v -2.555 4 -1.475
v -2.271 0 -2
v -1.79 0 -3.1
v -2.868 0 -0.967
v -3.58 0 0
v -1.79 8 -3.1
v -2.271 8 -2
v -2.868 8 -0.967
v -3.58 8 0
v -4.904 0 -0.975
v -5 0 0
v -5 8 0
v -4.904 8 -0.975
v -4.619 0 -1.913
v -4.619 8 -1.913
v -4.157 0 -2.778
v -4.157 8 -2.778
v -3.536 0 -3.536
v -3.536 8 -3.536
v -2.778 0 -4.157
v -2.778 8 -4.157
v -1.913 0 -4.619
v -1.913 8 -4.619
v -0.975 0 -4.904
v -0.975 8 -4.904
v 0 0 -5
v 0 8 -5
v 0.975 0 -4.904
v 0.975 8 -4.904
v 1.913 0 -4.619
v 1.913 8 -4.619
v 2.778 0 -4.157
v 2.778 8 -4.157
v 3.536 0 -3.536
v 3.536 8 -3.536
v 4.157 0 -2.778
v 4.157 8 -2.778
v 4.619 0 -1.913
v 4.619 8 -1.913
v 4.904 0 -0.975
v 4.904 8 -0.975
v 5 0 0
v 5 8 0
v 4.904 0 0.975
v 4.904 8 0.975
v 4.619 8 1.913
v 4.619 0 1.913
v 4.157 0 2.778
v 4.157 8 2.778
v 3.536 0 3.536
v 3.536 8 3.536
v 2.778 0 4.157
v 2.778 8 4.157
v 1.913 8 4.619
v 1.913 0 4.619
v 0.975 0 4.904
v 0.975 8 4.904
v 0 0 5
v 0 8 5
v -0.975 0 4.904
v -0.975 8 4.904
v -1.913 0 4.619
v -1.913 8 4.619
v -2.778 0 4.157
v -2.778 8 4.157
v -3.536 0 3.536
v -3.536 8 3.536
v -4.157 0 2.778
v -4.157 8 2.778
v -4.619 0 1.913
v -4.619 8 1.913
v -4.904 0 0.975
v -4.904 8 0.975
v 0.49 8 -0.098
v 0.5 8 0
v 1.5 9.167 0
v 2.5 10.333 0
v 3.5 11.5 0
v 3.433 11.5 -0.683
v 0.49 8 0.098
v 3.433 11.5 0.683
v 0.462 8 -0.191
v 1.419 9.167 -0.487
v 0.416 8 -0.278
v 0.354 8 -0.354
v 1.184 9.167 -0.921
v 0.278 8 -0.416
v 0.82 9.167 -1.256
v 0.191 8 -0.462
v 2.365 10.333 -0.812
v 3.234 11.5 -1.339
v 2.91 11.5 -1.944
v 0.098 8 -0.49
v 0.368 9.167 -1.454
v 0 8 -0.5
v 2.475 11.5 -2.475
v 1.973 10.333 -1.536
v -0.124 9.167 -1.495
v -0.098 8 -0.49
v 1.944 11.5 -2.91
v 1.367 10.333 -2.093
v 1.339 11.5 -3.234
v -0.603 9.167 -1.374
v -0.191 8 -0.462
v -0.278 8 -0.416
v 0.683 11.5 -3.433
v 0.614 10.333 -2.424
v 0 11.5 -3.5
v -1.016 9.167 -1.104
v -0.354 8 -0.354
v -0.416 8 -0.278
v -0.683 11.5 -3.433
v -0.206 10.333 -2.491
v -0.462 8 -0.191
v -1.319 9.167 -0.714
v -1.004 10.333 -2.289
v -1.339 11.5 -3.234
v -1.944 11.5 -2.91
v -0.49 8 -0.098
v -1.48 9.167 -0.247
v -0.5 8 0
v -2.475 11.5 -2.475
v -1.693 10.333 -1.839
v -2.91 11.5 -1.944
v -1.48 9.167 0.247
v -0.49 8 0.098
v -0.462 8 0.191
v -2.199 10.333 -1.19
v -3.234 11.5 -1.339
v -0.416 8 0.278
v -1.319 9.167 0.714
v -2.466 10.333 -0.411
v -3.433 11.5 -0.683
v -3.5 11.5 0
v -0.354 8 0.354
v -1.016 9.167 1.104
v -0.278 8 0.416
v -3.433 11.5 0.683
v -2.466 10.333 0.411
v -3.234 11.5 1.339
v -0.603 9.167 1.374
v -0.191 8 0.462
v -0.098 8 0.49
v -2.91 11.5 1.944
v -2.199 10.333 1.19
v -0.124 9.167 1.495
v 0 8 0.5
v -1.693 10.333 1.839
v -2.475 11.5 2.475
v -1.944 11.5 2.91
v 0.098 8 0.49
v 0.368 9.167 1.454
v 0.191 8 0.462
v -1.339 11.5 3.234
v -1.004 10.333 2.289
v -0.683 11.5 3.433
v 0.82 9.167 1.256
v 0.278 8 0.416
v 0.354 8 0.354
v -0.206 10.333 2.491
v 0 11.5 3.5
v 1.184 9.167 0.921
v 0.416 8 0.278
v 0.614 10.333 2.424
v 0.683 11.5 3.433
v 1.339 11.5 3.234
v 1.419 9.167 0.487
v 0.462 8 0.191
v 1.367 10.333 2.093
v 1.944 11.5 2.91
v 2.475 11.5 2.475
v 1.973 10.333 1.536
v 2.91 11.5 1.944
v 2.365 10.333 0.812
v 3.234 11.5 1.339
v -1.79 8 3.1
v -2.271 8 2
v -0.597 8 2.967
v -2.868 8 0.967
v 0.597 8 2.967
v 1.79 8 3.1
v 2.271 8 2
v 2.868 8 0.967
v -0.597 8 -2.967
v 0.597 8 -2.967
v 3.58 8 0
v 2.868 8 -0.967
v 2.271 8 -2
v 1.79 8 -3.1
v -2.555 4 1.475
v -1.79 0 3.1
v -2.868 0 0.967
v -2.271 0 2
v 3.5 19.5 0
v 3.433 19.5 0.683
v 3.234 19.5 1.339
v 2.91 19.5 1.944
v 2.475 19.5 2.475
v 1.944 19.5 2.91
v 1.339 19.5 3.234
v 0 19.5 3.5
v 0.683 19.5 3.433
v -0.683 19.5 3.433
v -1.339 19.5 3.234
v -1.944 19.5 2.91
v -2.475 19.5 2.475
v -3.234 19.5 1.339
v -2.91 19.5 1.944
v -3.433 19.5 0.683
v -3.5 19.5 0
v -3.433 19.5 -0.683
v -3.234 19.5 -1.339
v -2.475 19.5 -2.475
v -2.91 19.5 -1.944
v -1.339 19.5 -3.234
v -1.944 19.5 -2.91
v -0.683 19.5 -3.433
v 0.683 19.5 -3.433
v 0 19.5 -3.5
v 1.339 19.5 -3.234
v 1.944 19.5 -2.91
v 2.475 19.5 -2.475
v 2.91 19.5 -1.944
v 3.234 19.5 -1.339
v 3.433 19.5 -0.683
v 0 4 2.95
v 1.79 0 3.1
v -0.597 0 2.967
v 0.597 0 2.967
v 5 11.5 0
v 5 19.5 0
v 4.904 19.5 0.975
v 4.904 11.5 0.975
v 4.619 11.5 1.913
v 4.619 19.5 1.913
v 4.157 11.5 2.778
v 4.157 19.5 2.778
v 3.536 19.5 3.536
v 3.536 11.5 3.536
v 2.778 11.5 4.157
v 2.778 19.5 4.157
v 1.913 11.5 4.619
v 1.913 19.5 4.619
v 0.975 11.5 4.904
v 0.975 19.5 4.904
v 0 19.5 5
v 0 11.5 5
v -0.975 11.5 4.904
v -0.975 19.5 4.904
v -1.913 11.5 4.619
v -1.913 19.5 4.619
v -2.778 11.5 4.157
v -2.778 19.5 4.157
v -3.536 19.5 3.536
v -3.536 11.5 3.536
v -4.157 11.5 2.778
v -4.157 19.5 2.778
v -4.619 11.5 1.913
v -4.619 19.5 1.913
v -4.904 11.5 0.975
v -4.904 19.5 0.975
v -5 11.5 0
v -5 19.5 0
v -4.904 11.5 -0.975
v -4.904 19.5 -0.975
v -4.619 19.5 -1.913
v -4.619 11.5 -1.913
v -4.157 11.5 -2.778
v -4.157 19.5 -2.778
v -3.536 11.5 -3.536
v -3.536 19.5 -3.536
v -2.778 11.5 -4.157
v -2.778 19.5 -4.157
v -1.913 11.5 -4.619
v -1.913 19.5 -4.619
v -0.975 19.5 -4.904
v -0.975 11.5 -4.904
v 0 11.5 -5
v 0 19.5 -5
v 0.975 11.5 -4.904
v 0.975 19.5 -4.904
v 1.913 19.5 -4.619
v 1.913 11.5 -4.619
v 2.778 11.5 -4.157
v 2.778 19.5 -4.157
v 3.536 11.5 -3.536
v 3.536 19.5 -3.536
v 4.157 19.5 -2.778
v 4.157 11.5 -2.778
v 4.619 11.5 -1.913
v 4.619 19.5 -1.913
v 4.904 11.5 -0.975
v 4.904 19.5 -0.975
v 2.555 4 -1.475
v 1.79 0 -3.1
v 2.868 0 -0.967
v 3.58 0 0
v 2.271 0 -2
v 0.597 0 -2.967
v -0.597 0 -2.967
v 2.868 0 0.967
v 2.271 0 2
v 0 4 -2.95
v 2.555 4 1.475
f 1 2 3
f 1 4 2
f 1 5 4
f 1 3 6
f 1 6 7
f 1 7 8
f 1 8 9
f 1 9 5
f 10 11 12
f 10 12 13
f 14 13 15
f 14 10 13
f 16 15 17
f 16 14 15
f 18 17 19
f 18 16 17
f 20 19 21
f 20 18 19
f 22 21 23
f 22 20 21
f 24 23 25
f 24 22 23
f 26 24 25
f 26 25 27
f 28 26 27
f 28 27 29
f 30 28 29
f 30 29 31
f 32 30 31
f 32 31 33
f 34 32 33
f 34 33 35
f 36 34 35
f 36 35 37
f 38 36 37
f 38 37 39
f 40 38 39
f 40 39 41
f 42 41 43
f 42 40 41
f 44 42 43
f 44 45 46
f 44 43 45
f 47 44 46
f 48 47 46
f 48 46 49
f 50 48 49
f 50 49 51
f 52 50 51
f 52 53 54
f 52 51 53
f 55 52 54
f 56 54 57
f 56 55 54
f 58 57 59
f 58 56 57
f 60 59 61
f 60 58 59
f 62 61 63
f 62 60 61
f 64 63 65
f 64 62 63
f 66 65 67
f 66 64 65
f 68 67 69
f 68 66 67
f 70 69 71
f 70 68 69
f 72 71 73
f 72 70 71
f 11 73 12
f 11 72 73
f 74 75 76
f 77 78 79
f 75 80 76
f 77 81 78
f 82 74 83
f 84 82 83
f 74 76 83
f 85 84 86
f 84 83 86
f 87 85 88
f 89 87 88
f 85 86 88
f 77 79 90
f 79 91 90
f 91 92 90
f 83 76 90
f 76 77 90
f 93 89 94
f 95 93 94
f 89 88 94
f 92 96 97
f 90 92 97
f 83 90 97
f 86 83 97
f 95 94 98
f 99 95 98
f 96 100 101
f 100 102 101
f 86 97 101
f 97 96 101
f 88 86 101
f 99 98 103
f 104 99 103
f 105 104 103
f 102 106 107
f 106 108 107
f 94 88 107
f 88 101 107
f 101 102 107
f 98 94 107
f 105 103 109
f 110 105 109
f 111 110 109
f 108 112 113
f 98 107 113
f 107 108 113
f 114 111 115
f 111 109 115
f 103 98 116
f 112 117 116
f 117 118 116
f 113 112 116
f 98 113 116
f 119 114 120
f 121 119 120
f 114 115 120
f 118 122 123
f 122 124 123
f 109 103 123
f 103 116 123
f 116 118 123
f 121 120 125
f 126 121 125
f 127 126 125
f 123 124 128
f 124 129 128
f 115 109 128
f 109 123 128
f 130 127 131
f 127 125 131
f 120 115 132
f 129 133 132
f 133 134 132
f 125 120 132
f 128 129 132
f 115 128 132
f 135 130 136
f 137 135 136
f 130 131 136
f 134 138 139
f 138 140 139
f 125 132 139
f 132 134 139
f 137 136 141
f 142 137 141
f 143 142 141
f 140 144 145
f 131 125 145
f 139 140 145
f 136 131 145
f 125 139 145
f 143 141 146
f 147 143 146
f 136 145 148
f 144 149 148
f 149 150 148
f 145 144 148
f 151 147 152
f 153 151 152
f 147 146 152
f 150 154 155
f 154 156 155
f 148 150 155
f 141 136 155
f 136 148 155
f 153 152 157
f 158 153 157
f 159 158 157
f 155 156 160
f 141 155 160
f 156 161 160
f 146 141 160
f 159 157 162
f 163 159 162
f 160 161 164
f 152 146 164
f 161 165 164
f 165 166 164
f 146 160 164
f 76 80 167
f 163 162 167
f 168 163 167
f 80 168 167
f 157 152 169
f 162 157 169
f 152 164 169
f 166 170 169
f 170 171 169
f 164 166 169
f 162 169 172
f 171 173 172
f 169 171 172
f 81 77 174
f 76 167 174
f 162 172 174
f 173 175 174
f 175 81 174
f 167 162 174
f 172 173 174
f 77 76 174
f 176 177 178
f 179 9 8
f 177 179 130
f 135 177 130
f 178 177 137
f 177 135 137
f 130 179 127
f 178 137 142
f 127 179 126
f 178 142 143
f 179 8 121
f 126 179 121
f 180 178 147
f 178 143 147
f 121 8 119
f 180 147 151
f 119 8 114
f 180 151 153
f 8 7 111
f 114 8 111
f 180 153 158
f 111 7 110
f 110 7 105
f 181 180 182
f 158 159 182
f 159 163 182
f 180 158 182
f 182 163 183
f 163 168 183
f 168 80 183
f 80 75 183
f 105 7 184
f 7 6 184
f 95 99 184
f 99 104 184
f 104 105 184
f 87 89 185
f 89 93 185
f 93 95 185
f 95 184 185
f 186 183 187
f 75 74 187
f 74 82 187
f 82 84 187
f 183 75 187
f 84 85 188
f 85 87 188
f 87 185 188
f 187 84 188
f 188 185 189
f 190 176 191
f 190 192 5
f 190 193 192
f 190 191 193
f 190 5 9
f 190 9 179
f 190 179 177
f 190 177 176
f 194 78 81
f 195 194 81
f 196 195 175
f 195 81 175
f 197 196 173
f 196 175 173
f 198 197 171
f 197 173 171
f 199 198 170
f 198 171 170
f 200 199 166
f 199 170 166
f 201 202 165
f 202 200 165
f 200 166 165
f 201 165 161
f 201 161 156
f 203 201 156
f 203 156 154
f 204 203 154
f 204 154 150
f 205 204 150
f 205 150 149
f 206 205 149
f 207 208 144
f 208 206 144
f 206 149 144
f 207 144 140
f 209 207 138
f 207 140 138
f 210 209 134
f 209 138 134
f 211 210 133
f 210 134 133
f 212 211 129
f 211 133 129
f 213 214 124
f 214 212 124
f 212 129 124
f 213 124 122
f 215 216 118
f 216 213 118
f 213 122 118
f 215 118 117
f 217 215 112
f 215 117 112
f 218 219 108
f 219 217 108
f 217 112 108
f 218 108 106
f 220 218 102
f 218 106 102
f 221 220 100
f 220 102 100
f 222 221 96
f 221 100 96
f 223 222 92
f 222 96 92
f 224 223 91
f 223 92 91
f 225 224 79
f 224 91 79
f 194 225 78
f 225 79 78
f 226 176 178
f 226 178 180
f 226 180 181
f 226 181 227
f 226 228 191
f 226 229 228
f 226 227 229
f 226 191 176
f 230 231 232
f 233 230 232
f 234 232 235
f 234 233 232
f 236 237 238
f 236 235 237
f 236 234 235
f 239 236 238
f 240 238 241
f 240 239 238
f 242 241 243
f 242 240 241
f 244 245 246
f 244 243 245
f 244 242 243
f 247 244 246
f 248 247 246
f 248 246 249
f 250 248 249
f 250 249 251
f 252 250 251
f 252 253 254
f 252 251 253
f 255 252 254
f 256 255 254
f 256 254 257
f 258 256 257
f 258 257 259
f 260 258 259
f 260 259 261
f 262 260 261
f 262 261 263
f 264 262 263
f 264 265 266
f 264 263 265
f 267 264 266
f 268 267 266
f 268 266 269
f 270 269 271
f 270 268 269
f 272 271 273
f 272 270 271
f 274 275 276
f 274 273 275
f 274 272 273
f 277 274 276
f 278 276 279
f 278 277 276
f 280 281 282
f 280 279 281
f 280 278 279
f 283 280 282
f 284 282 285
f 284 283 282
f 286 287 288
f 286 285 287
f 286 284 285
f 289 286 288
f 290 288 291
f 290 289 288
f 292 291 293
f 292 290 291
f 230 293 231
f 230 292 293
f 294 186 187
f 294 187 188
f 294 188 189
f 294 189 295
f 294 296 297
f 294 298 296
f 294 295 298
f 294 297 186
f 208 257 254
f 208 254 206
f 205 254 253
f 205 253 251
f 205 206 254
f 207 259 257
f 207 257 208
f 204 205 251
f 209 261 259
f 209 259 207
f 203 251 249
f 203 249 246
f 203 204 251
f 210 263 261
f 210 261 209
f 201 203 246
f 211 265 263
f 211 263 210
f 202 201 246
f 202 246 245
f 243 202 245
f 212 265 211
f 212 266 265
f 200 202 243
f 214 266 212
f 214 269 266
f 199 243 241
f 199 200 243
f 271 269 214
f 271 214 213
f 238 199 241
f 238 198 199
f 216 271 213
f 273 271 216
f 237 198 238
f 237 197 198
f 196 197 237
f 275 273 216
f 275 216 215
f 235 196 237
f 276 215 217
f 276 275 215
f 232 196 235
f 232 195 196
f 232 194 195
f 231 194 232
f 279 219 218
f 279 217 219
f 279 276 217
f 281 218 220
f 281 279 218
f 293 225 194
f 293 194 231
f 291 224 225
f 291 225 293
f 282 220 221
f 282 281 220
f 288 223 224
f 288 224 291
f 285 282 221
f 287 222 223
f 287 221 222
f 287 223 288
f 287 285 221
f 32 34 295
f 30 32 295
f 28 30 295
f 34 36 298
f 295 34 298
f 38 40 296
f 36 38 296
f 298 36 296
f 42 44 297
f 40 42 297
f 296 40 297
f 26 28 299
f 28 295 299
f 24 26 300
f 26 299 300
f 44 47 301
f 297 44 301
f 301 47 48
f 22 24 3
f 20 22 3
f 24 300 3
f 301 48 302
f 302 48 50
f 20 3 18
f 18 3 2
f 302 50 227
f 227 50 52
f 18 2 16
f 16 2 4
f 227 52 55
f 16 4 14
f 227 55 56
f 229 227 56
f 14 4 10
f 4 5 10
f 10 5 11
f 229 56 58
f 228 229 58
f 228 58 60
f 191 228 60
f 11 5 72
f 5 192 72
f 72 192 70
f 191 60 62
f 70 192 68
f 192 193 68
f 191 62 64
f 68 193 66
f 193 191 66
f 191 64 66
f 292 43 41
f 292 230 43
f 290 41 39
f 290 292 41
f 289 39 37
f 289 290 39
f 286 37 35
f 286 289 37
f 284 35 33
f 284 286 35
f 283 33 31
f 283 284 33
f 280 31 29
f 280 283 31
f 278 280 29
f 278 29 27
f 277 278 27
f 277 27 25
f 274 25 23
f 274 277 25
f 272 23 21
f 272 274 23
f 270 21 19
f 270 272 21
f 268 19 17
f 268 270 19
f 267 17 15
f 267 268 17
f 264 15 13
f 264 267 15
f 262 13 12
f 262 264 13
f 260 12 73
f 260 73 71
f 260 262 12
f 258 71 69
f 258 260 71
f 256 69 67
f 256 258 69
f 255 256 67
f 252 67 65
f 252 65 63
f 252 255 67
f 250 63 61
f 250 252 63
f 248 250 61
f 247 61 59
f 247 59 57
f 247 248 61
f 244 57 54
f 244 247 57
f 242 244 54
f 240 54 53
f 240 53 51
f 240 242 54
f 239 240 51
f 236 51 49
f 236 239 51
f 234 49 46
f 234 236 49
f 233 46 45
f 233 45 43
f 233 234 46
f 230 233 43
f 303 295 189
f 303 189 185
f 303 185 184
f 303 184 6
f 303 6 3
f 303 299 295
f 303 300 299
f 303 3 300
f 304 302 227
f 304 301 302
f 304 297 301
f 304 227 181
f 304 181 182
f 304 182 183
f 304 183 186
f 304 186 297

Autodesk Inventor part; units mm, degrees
ref_plane "YZ Plane" through (0, 0, 0) normal (1, 0, 0) x (0, 1, 0)
ref_plane "XZ Plane" through (0, 0, 0) normal (0, 1, 0) x (-1, 0, 0)
ref_plane "XY Plane" through (0, 0, 0) normal (0, 0, 1) x (1, 0, 0)
sketch "Sketch1" plane through (0, 0, 0) normal (0, 1, 0) x (-1, 0, 0)
  line L0 (-1.7898, -3.1) -> (-3.5796, 0)
  line L1 (-3.5796, 0) -> (-1.7898, 3.1)
  line L2 (-1.7898, 3.1) -> (1.7898, 3.1)
  line L3 (1.7898, 3.1) -> (3.5796, 0)
  line L4 (3.5796, 0) -> (1.7898, -3.1)
  line L5 (1.7898, -3.1) -> (-1.7898, -3.1)
  circle A0 centre (0, 0) radius 5
  spline S0 degree 2 poles (1.7898, 3.1) (0, 2.8) (-1.7898, 3.1) knots 0 0 0 1 1 1
  spline S1 degree 2 poles (-1.7898, 3.1) (-2.4249, 1.4) (-3.5796, 0) knots 0 0 0 1 1 1
  spline S2 degree 2 poles (-3.5796, 0) (-2.4249, -1.4) (-1.7898, -3.1) knots 0 0 0 1 1 1
  spline S3 degree 2 poles (-1.7898, -3.1) (0, -2.8) (1.7898, -3.1) knots 0 0 0 1 1 1
  spline S4 degree 2 poles (1.7898, -3.1) (2.4249, -1.4) (3.5796, 0) knots 0 0 0 1 1 1
  spline S5 degree 2 poles (3.5796, 0) (2.4249, 1.4) (1.7898, 3.1) knots 0 0 0 1 1 1
  point P0 (0, 0)
  point P1 (0, 0)
  point P2 (0, -3.1)
  point P3 (0, 2.95)
  point P4 (0, 3.1)
  point P5 (-2.5548, 1.475)
  point P6 (-2.5548, -1.475)
  point P7 (0, -2.95)
  point P8 (2.5548, -1.475)
  point P9 (2.5548, 1.475)
  point P10 (1.7898, 3.1)
  point P11 (1.7898, 3.1)
  point P12 (1.7898, 3.1)
  dimension "d0" = 3.1
  dimension "d1" = 10
  dimension "d27" = 0.15
  dimension "d30" = 360
extrude "Extrusion1" add sketch "Sketch1" along normal blind 8 contours S3 L5 | L0 S2 | L1 S1 | S4 L4 | L2 S0 | S5 L3 | A0
sketch "Sketch2" plane through (0, 8, 0) normal (0, 1, 0) x (1, 0, 0)
  circle A0 centre (0, 0) radius 0.5
  circle A1 centre (0, 0) radius 5 projected
  circle A2 centre (0, 0) radius 5
  dimension "d4" = 1
sketch "Sketch5" plane through (0, 0, 0) normal (0, 0, 1) x (1, 0, 0)
  line L0 (5, 8) -> (-5, 8) projected
  line L1 (5, 8) -> (5, 11.5)
  line L2 (5, 11.5) -> (3.5, 11.5)
  line L3 (5, 8) -> (0.5, 8)
  line L4 (0.5, 8) -> (3.5, 11.5)
  line L5 (0, 8) -> (0, 11)
  point P0 (0, 0)
  dimension "d20" = 3.5
  dimension "d21" = 1.5
  dimension "d22" = 4.5
  dimension "d23" = 3
revolve "Revolution1" add sketch "Sketch5" angle 360 about axis through (0, 8, 0) along (0, 1, 0)
sketch "Sketch7" plane through (0, 11.5, 0) normal (0, 1, 0) x (1, 0, 0)
  circle A0 centre (0, 0) radius 0.5 projected
  circle A1 centre (0, 0) radius 3.5
  circle A2 centre (0, 0) radius 5
extrude "Extrusion2" add sketch "Sketch7" along normal blind 8 contours A2
properties part number "seegoals_adapter_puller_tool_v1"
